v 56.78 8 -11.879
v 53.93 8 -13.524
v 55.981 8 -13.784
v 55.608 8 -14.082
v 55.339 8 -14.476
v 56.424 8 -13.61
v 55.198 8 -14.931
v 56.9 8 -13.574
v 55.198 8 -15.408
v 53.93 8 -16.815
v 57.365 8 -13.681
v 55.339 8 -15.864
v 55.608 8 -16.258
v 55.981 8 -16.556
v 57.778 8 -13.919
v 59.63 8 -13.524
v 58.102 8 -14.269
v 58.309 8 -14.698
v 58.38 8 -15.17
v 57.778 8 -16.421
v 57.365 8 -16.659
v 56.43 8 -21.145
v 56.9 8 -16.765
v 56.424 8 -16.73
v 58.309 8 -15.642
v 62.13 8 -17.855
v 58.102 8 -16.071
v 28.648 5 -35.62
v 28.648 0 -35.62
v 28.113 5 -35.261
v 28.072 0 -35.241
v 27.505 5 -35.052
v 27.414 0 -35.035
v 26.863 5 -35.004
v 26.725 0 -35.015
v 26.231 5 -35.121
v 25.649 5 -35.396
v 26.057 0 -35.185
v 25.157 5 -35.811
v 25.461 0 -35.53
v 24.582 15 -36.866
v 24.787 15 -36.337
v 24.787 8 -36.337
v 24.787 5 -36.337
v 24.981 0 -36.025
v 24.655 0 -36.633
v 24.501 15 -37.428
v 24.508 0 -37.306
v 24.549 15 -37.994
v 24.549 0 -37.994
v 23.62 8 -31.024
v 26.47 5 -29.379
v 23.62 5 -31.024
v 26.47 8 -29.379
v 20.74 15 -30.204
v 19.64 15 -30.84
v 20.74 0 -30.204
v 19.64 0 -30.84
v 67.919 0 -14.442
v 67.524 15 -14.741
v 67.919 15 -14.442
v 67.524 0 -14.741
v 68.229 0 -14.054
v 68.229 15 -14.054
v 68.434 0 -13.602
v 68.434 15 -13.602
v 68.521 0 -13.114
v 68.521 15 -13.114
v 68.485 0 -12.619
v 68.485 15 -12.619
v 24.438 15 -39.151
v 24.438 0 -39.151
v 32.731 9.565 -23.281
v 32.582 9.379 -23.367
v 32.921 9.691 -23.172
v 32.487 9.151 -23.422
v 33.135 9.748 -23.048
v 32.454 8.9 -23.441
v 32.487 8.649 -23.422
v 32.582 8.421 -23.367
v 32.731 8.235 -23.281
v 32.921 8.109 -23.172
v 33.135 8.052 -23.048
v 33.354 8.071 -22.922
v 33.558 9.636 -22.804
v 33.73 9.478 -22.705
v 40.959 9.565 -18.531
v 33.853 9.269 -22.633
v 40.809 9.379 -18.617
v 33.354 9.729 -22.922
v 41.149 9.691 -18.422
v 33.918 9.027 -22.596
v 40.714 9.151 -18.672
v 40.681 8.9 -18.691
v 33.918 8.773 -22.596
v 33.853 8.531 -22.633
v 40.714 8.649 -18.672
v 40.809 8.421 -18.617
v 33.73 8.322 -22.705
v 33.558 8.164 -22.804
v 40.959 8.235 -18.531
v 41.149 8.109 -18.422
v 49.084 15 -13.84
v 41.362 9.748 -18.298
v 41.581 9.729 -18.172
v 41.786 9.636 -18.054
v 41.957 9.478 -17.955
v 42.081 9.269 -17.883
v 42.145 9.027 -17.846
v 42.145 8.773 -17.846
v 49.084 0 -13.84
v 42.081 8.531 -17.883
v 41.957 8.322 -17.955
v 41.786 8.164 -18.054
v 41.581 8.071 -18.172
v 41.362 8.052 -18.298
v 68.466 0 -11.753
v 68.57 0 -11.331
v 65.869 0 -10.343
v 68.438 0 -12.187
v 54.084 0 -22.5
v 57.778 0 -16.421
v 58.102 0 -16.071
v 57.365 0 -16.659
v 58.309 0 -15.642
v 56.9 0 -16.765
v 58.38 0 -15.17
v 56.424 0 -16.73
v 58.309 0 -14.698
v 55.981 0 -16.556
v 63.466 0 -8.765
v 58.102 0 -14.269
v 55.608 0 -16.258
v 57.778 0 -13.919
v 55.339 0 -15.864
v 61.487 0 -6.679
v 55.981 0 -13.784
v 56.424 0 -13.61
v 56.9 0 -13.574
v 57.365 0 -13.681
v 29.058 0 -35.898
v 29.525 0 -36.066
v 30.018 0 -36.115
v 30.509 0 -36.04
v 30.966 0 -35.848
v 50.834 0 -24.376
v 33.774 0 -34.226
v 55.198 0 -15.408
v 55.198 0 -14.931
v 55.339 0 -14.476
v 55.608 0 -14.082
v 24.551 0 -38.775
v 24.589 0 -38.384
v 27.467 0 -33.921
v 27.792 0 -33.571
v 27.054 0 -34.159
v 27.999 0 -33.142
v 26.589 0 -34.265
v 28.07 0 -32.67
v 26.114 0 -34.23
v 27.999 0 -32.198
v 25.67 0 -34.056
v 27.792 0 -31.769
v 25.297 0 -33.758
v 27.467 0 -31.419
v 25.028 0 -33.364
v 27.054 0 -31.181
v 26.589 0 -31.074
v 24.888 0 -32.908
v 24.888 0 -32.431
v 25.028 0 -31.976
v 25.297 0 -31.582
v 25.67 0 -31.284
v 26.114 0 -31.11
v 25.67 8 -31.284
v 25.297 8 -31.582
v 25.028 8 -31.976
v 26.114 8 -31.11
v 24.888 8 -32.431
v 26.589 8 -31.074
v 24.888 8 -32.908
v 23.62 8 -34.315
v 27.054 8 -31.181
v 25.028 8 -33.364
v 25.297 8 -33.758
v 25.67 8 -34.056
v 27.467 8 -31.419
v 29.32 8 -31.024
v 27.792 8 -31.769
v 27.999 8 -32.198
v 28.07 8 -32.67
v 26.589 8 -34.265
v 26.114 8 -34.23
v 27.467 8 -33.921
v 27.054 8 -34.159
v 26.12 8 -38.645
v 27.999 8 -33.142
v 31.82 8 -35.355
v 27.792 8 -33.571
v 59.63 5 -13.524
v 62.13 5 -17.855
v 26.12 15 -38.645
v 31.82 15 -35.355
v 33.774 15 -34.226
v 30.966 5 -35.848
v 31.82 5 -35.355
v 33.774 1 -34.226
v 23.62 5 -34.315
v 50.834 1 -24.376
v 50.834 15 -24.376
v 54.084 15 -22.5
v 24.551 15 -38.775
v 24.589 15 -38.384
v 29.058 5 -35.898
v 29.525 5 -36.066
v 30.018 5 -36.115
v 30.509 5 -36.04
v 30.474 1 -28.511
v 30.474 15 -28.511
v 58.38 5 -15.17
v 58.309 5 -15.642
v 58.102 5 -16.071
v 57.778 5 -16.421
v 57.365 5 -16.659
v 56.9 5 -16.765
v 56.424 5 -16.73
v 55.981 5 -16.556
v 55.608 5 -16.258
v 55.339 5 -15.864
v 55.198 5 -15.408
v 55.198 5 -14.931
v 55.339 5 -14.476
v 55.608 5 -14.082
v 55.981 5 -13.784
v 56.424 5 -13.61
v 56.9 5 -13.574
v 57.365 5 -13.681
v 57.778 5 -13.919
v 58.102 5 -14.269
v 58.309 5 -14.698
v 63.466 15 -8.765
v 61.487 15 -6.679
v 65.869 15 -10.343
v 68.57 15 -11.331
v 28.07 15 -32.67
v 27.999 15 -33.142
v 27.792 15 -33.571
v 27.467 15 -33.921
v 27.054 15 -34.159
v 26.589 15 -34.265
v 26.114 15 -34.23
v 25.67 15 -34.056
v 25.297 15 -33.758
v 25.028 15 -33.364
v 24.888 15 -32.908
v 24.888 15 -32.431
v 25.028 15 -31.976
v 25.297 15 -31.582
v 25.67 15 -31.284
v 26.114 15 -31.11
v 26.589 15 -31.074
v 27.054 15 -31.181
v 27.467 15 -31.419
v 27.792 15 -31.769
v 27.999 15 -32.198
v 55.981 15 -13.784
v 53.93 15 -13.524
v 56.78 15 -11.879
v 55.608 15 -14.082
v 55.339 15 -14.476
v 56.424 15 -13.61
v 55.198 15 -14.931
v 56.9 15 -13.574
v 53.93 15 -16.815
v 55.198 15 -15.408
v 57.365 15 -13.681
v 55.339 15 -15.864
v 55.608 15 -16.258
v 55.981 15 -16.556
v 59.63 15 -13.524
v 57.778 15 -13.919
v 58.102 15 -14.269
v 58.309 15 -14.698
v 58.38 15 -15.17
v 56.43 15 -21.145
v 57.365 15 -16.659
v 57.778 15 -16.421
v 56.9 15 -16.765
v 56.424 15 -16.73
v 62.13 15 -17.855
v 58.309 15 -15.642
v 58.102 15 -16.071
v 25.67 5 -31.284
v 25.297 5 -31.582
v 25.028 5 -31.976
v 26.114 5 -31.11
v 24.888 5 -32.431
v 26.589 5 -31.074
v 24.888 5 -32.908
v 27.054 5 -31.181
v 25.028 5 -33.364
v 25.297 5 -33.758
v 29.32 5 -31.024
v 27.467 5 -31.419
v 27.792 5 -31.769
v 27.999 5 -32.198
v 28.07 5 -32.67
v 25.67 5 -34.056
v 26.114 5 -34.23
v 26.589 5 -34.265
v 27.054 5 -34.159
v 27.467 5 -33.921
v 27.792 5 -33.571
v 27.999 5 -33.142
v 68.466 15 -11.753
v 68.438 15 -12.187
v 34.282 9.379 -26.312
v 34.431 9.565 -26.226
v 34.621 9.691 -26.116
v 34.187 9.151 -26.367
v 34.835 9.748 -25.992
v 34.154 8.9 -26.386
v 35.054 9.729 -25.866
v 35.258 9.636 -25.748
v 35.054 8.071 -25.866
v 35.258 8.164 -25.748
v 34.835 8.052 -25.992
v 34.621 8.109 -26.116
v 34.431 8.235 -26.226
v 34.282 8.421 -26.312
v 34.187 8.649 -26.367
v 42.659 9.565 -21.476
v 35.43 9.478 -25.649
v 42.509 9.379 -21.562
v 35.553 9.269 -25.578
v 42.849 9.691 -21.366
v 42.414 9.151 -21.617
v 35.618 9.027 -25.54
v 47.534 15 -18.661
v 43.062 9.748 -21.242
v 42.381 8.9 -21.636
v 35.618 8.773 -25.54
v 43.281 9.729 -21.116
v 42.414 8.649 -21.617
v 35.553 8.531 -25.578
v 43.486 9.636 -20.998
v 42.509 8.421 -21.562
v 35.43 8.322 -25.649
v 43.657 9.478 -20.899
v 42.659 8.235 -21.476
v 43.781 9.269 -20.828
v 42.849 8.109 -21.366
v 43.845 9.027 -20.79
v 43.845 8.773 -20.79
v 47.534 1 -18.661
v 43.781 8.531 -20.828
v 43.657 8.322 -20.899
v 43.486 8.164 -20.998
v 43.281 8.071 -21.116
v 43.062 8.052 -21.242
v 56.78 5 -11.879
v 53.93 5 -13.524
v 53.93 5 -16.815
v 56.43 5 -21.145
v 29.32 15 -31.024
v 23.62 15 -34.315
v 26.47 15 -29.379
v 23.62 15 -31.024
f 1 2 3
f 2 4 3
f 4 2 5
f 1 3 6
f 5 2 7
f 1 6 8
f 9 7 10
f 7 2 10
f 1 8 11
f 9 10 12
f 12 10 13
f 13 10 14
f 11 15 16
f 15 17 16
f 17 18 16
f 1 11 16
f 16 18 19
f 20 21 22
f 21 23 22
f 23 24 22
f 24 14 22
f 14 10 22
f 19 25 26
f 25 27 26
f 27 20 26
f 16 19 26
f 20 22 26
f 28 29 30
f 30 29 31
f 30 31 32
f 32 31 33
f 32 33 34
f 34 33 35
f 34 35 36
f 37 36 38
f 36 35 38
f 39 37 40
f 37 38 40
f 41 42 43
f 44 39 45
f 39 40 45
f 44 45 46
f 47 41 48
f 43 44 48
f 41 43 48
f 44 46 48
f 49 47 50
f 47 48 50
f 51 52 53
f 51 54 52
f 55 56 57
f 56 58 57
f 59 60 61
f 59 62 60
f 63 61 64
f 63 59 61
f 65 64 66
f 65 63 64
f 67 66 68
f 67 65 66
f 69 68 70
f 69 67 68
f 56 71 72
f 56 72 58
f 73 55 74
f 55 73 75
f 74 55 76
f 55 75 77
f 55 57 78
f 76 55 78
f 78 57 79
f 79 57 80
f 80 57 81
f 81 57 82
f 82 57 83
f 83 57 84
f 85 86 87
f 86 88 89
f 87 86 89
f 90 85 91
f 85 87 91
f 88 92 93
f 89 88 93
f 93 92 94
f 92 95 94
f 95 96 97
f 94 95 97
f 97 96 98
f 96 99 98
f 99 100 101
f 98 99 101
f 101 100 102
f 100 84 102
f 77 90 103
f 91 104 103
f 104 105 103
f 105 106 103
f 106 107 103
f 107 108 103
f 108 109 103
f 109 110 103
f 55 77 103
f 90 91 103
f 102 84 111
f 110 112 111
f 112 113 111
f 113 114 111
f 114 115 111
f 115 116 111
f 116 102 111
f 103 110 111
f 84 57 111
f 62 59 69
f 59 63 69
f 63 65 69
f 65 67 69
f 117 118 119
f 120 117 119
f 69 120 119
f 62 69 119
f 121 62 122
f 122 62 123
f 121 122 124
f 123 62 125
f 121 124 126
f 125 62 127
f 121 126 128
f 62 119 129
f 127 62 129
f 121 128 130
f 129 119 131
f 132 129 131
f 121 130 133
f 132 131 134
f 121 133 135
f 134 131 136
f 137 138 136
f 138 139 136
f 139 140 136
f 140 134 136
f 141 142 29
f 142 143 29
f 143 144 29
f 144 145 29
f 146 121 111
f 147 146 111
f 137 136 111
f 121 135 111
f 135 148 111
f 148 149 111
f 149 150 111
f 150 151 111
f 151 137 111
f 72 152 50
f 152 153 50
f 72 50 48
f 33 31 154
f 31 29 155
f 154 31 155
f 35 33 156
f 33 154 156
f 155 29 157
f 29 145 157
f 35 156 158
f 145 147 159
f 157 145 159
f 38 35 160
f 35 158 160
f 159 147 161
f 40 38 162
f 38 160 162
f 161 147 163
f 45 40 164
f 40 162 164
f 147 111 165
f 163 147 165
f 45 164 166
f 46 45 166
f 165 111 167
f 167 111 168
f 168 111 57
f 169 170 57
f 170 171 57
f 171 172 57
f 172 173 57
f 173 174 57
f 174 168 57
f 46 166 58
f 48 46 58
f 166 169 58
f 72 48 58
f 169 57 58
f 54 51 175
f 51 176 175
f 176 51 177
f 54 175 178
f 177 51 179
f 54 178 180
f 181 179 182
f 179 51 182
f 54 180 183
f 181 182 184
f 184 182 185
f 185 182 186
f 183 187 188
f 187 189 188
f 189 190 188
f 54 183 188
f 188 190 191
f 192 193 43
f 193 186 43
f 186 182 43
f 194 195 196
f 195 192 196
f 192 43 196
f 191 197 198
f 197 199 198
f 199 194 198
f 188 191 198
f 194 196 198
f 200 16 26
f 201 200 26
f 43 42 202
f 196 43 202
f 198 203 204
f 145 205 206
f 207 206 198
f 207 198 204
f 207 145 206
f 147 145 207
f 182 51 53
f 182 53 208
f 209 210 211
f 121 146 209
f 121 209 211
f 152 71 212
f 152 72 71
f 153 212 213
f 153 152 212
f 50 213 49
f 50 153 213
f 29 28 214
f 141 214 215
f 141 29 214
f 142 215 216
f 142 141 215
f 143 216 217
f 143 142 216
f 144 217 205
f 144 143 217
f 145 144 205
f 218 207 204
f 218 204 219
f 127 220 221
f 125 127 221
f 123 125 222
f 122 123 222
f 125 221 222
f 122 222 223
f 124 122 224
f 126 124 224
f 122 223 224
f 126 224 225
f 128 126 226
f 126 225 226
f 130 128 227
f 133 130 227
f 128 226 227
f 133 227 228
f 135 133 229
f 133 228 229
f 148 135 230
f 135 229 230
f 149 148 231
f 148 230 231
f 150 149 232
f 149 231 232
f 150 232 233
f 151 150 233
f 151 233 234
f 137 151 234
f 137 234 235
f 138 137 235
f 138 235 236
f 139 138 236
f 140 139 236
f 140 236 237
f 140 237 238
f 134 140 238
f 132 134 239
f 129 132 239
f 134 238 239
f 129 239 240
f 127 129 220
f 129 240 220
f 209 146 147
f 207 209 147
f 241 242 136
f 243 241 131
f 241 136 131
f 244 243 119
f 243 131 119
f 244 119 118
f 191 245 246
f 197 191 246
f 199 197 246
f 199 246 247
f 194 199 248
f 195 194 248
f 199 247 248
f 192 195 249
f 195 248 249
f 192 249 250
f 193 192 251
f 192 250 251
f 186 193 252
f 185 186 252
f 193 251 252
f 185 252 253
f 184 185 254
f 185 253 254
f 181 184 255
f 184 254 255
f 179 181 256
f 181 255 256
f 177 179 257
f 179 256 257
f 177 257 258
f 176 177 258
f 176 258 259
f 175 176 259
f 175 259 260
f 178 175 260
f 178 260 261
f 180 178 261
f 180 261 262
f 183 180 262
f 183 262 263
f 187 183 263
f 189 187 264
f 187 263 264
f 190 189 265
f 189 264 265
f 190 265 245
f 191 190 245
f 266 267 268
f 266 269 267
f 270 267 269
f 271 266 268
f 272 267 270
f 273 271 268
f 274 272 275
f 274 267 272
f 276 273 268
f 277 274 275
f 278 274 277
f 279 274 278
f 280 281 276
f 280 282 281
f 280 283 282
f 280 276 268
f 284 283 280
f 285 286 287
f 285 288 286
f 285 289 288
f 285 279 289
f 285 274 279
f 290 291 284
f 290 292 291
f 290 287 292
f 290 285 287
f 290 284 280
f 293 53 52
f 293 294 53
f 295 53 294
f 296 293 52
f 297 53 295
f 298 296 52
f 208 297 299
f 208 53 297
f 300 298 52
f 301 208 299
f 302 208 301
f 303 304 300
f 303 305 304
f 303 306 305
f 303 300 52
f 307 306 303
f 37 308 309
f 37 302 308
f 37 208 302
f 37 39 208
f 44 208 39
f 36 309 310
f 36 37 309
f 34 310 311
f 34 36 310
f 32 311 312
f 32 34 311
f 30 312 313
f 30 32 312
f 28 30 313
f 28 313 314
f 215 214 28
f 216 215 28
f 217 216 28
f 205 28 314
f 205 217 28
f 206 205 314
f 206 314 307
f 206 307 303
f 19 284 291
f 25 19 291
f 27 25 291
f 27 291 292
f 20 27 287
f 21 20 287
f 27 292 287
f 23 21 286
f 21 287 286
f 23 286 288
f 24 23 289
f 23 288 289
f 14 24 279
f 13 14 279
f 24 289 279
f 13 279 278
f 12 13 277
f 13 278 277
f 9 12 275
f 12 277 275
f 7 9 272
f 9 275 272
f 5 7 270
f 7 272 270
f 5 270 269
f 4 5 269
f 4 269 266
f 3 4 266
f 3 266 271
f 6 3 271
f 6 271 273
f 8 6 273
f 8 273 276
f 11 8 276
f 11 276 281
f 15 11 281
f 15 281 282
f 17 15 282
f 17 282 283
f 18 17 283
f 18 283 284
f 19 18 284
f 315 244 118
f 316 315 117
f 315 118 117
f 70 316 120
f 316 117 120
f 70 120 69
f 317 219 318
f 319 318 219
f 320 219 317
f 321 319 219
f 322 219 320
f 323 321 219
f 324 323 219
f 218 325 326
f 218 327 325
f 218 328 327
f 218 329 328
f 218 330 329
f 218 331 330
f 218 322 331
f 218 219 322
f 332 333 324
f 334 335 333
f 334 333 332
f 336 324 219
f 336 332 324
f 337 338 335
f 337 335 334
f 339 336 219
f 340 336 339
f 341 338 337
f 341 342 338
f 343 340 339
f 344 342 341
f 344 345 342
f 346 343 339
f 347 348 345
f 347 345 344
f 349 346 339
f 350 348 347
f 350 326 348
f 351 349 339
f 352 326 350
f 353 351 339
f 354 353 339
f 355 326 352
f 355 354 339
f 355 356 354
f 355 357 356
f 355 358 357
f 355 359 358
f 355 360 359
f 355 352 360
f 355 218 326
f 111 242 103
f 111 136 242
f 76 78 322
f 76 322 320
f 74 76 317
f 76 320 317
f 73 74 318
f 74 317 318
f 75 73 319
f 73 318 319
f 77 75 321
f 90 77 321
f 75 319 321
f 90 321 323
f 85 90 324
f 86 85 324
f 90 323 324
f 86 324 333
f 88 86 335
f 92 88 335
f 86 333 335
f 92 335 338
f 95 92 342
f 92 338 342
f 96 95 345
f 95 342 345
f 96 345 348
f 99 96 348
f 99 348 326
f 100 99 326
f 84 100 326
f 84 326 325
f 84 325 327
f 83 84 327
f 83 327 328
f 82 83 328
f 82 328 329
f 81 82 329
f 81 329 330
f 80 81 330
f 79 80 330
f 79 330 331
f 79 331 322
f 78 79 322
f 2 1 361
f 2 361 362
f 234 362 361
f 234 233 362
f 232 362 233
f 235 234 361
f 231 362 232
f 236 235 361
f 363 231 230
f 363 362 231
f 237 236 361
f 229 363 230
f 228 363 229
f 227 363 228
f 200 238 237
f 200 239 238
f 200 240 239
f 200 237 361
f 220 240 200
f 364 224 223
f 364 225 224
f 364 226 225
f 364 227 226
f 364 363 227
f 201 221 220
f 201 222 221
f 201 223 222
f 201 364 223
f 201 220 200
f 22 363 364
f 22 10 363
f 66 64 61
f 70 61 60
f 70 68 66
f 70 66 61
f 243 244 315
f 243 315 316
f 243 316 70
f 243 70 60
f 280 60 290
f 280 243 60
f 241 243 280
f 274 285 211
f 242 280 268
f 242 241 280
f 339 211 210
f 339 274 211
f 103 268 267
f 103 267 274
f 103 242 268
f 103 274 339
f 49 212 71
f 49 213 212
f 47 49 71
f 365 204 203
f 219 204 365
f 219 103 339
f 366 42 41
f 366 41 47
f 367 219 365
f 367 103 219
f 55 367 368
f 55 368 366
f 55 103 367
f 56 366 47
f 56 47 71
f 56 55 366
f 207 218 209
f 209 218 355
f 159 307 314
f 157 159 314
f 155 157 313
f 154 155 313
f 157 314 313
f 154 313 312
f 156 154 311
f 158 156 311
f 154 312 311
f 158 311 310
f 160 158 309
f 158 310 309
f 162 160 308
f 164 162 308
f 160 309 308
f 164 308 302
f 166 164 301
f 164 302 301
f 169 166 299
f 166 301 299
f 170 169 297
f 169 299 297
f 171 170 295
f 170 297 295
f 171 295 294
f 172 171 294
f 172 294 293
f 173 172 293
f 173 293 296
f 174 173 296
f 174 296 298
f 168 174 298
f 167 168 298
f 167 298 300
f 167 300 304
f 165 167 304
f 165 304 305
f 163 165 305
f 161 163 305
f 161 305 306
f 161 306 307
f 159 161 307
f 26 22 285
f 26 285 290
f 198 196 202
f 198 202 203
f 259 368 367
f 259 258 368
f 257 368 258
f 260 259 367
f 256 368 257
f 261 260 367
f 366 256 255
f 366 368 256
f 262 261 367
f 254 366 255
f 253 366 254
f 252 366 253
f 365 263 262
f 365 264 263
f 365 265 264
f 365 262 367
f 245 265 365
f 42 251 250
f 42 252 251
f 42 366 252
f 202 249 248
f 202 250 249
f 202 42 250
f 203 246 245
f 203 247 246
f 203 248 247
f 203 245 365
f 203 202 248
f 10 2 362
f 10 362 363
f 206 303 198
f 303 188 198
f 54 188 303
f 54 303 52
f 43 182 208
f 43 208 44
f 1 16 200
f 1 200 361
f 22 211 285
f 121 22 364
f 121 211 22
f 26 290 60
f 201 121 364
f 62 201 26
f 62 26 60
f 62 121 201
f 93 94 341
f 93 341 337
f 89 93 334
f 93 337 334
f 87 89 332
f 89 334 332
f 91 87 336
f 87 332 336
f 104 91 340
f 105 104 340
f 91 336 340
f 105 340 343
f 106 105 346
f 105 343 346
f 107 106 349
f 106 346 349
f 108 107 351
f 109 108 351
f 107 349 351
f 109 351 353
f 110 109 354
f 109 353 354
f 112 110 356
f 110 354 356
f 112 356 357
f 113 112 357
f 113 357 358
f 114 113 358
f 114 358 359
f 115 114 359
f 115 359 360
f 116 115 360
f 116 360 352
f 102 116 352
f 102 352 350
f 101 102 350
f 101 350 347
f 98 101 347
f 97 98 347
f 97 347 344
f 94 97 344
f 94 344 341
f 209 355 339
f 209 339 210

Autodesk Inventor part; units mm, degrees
ref_plane "YZ Plane" through (0, 0, 0) normal (1, 0, 0) x (0, 1, 0)
ref_plane "XZ Plane" through (0, 0, 0) normal (0, 1, 0) x (-1, 0, 0)
ref_plane "XY Plane" through (0, 0, 0) normal (0, 0, 1) x (1, 0, 0)
sketch "スケッチ1" plane through (0, 0, 0) normal (0, 1, 0) x (-1, 0, 0)
  line L0 (0, 0) -> (0, -40)
  line L1 (0, -40) -> (-23.7735, -40)
  line L2 (-23.7735, -40) -> (-54.0844, -22.5)
  line L3 (0, -30) -> (-18, -30)
  line L4 (-18, -30) -> (-38, -18.453)
  line L5 (-28, -24.2265) -> (-28, 11.9512)
  line L6 (-18, -30) -> (-23.7735, -40)
  line L7 (-18.7735, -31.3397) -> (-20.74, -30.2044)
  line L8 (-20.74, -30.2044) -> (-58.951, -8.1433)
  line L9 (-33.7735, -34.2265) -> (-30.4735, -28.5107)
  line L10 (-30.4735, -28.5107) -> (-47.5342, -18.6607)
  line L11 (-47.5342, -18.6607) -> (-50.8342, -24.3765)
  line L12 (-50.8342, -24.3765) -> (-33.7735, -34.2265)
  line L13 (-30.4735, -28.5107) -> (-28, -24.2265)
  line L14 (-24.6395, -39.5) -> (-19.5508, -30.686)
  line L15 (-54.0844, -22.5) -> (-49.0844, -13.8397)
  point P0 (-19.6395, -30.8397)
  dimension "d0" = 40
  dimension "d1" = 30
  dimension "d2" = 18
  dimension "d3" = 30
  dimension "d4" = 38
  dimension "d5" = 10
  dimension "d6" = 10
  dimension "d7" = 19.7
  dimension "d8" = 6.6
  dimension "d9" = 1
  dimension "d10" = 35
extrude "押し出し1" add sketch "スケッチ1" along normal blind 15 contours L2 L9 L13 L8 L7 L14 | L13 L10 L11 L2 L15 L8
sketch "スケッチ2" plane through (0, 0, 0) normal (0, -1, 0) x (1, 0, 0)
  line L0 (30.4735, -28.5107) -> (33.7735, -34.2265) projected
  line L1 (47.5342, -18.6607) -> (30.4735, -28.5107) projected
  line L2 (50.8342, -24.3765) -> (47.5342, -18.6607) projected
  line L3 (54.0844, -22.5) -> (50.8342, -24.3765) projected
  line L4 (49.0844, -13.8397) -> (54.0844, -22.5) projected
  line L5 (19.6395, -30.8397) -> (49.0844, -13.8397) projected
  line L6 (24.6395, -39.5) -> (19.6395, -30.8397) projected
  line L7 (33.7735, -34.2265) -> (24.6395, -39.5) projected
  line L8 (50.8342, -24.3765) -> (33.7735, -34.2265)
  point P0 (0, 0)
extrude "押し出し2" add sketch "スケッチ2" against normal blind 1
sketch "スケッチ3" plane through (30.4735, 1, -28.5107) normal (0.5, 0, -0.8660254) x (-0.8660254, 0, -0.5)
  line L0 (-19.7, 0) -> (0, 0) projected
  line L1 (-19.7, 14) -> (0, 14) projected
  line L2 (-9.85, 14) -> (-9.85, 0)
  line L3 (-19.7, 0) -> (0, 0) projected
  circle A0 centre (-14.6, 7.9) radius 0.85
  circle A1 centre (-5.1, 7.9) radius 0.85
  point P0 (12.1355, -1)
  dimension "d16" = 1.7
  dimension "d17" = 9.5
  dimension "d18" = 7.9
extrude "押し出し3" cut sketch "スケッチ3" against normal through all
sketch "スケッチ4" plane through (0, 0, 0) normal (0, -1, 0) x (1, 0, 0)
  circle A0 centre (50.5, 0) radius 1.35 projected
  circle A1 centre (50.5, 0) radius 12.5
  line L0 (49.0844, -13.8397) -> (54.0844, -22.5) projected
  line L1 (49.0844, -13.8397) -> (54.0844, -22.5)
  line L2 (54.0844, -22.5) -> (74.7158, -10.5885)
  line L3 (74.7158, -10.5885) -> (69.7158, -1.9282)
  line L4 (69.7158, -1.9282) -> (49.0844, -13.8397)
  line L5 (74.7158, -10.5885) -> (86.6025, 10) projected
  circle A2 centre (71.4838, 0.8246) radius 1.5 projected
  circle A3 centre (71.4838, 0.8246) radius 12.5
  point P0 (0, 0)
  point P1 (60.8076, -7.0714)
  point P2 (51.4702, -12.4623)
  point P3 (72.3273, -6.4515)
  point P4 (61.4867, -6.6793)
  point P5 (72.9912, -11.5842)
  dimension "d21" = 25
  dimension "d24" = 25
extrude "押し出し4" add sketch "スケッチ4" against normal up to surface (15 mm away) contours L4 A1 | A1 L4 A3 L2 L0
sketch "スケッチ5" plane through (0, 15, 0) normal (0, 1, 0) x (1, 0, 0)
  line L0 (56.7805, 18.4608) -> (59.6305, 16.8153)
  line L1 (59.6305, 16.8153) -> (59.6305, 13.5244)
  line L2 (59.6305, 13.5244) -> (56.7805, 11.879)
  line L3 (56.7805, 11.879) -> (53.9305, 13.5244)
  line L4 (53.9305, 13.5244) -> (53.9305, 16.8153)
  line L5 (53.9305, 16.8153) -> (56.7805, 18.4608)
  line L6 (26.4697, 35.9608) -> (29.3197, 34.3153)
  line L7 (29.3197, 34.3153) -> (29.3197, 31.0244)
  line L8 (29.3197, 31.0244) -> (26.4697, 29.379)
  line L9 (26.4697, 29.379) -> (23.6197, 31.0244)
  line L10 (23.6197, 31.0244) -> (23.6197, 34.3153)
  line L11 (23.6197, 34.3153) -> (26.4697, 35.9608)
  line L12 (19.6395, 30.8397) -> (61.4867, 6.6793) projected
  line L13 (24.6395, 39.5) -> (19.6395, 30.8397) projected
  circle A0 centre (56.7805, 15.1699) radius 1.6
  circle A1 centre (26.4697, 32.6699) radius 1.6
  line L14 (23.8895, 39.933) -> (74.5998, 10.6554)
  line L15 (59.6305, 13.5244) -> (62.1305, 17.8546)
  line L16 (53.9305, 16.8153) -> (56.4305, 21.1454)
  line L17 (29.3197, 31.0244) -> (31.8197, 35.3546)
  line L18 (23.6197, 34.3153) -> (26.1197, 38.6454)
  point P0 (0, 0)
  dimension "d25" = 5.7
  dimension "d26" = 5
  dimension "d27" = 5
  dimension "d28" = 40
  dimension "d29" = 3.2
extrude "押し出し5" cut sketch "スケッチ5" against normal blind 10 contours L5 L16 L14 L15 L1 L0 | L0 L1 L2 L3 L4 L5 | L11 L18 L14 L17 L7 L6 | L6 L7 L8 L9 L10 L11 | A0 | A1
extrude "押し出し6" cut sketch "スケッチ5" against normal through all contours A0 | A1
sketch "スケッチ6" plane through (0, 0, 0) normal (0, -1, 0) x (1, 0, 0)
  arc A0 (28.6476, -35.6197) -> (24.5492, -37.9938) centre (27, -37.5) ccw projected
  arc A1 (23.7735, -40) -> (24.5492, -37.9938) centre (22.5886, -38.3888) ccw projected
  arc A2 (28.6476, -35.6197) -> (30.9657, -35.8476) centre (29.9657, -34.1155) ccw projected
  arc A3 (72.5905, -10.2571) -> (68.4853, -12.6194) centre (70.9375, -12.1327) ccw projected
  arc A4 (67.5236, -14.7409) -> (68.4853, -12.6194) centre (66.5236, -13.0088) ccw projected
  circle A5 centre (26.4697, -32.6699) radius 1.6 projected
  circle A6 centre (56.7805, -15.1699) radius 1.6 projected
  line L0 (24.6395, -39.5) -> (72.9912, -11.5842) projected
  arc A7 (61.4867, -6.6793) -> (72.9912, -11.5842) centre (71.4838, 0.8246) ccw projected
  line L1 (19.6395, -30.8397) -> (61.4867, -6.6793) projected
  line L2 (24.6395, -39.5) -> (19.6395, -30.8397) projected
  point P0 (0, 0)
  point P1 (24.4378, -39.1507)
  point P2 (68.5695, -11.3309)
extrude "押し出し7" cut sketch "スケッチ6" against normal through all contours A2 L0 L2 A1 A0 | A4 A3 A7 L0
extrude "押し出し8" add sketch "スケッチ5" against normal blind 7
properties part number "limit_setter_under"
